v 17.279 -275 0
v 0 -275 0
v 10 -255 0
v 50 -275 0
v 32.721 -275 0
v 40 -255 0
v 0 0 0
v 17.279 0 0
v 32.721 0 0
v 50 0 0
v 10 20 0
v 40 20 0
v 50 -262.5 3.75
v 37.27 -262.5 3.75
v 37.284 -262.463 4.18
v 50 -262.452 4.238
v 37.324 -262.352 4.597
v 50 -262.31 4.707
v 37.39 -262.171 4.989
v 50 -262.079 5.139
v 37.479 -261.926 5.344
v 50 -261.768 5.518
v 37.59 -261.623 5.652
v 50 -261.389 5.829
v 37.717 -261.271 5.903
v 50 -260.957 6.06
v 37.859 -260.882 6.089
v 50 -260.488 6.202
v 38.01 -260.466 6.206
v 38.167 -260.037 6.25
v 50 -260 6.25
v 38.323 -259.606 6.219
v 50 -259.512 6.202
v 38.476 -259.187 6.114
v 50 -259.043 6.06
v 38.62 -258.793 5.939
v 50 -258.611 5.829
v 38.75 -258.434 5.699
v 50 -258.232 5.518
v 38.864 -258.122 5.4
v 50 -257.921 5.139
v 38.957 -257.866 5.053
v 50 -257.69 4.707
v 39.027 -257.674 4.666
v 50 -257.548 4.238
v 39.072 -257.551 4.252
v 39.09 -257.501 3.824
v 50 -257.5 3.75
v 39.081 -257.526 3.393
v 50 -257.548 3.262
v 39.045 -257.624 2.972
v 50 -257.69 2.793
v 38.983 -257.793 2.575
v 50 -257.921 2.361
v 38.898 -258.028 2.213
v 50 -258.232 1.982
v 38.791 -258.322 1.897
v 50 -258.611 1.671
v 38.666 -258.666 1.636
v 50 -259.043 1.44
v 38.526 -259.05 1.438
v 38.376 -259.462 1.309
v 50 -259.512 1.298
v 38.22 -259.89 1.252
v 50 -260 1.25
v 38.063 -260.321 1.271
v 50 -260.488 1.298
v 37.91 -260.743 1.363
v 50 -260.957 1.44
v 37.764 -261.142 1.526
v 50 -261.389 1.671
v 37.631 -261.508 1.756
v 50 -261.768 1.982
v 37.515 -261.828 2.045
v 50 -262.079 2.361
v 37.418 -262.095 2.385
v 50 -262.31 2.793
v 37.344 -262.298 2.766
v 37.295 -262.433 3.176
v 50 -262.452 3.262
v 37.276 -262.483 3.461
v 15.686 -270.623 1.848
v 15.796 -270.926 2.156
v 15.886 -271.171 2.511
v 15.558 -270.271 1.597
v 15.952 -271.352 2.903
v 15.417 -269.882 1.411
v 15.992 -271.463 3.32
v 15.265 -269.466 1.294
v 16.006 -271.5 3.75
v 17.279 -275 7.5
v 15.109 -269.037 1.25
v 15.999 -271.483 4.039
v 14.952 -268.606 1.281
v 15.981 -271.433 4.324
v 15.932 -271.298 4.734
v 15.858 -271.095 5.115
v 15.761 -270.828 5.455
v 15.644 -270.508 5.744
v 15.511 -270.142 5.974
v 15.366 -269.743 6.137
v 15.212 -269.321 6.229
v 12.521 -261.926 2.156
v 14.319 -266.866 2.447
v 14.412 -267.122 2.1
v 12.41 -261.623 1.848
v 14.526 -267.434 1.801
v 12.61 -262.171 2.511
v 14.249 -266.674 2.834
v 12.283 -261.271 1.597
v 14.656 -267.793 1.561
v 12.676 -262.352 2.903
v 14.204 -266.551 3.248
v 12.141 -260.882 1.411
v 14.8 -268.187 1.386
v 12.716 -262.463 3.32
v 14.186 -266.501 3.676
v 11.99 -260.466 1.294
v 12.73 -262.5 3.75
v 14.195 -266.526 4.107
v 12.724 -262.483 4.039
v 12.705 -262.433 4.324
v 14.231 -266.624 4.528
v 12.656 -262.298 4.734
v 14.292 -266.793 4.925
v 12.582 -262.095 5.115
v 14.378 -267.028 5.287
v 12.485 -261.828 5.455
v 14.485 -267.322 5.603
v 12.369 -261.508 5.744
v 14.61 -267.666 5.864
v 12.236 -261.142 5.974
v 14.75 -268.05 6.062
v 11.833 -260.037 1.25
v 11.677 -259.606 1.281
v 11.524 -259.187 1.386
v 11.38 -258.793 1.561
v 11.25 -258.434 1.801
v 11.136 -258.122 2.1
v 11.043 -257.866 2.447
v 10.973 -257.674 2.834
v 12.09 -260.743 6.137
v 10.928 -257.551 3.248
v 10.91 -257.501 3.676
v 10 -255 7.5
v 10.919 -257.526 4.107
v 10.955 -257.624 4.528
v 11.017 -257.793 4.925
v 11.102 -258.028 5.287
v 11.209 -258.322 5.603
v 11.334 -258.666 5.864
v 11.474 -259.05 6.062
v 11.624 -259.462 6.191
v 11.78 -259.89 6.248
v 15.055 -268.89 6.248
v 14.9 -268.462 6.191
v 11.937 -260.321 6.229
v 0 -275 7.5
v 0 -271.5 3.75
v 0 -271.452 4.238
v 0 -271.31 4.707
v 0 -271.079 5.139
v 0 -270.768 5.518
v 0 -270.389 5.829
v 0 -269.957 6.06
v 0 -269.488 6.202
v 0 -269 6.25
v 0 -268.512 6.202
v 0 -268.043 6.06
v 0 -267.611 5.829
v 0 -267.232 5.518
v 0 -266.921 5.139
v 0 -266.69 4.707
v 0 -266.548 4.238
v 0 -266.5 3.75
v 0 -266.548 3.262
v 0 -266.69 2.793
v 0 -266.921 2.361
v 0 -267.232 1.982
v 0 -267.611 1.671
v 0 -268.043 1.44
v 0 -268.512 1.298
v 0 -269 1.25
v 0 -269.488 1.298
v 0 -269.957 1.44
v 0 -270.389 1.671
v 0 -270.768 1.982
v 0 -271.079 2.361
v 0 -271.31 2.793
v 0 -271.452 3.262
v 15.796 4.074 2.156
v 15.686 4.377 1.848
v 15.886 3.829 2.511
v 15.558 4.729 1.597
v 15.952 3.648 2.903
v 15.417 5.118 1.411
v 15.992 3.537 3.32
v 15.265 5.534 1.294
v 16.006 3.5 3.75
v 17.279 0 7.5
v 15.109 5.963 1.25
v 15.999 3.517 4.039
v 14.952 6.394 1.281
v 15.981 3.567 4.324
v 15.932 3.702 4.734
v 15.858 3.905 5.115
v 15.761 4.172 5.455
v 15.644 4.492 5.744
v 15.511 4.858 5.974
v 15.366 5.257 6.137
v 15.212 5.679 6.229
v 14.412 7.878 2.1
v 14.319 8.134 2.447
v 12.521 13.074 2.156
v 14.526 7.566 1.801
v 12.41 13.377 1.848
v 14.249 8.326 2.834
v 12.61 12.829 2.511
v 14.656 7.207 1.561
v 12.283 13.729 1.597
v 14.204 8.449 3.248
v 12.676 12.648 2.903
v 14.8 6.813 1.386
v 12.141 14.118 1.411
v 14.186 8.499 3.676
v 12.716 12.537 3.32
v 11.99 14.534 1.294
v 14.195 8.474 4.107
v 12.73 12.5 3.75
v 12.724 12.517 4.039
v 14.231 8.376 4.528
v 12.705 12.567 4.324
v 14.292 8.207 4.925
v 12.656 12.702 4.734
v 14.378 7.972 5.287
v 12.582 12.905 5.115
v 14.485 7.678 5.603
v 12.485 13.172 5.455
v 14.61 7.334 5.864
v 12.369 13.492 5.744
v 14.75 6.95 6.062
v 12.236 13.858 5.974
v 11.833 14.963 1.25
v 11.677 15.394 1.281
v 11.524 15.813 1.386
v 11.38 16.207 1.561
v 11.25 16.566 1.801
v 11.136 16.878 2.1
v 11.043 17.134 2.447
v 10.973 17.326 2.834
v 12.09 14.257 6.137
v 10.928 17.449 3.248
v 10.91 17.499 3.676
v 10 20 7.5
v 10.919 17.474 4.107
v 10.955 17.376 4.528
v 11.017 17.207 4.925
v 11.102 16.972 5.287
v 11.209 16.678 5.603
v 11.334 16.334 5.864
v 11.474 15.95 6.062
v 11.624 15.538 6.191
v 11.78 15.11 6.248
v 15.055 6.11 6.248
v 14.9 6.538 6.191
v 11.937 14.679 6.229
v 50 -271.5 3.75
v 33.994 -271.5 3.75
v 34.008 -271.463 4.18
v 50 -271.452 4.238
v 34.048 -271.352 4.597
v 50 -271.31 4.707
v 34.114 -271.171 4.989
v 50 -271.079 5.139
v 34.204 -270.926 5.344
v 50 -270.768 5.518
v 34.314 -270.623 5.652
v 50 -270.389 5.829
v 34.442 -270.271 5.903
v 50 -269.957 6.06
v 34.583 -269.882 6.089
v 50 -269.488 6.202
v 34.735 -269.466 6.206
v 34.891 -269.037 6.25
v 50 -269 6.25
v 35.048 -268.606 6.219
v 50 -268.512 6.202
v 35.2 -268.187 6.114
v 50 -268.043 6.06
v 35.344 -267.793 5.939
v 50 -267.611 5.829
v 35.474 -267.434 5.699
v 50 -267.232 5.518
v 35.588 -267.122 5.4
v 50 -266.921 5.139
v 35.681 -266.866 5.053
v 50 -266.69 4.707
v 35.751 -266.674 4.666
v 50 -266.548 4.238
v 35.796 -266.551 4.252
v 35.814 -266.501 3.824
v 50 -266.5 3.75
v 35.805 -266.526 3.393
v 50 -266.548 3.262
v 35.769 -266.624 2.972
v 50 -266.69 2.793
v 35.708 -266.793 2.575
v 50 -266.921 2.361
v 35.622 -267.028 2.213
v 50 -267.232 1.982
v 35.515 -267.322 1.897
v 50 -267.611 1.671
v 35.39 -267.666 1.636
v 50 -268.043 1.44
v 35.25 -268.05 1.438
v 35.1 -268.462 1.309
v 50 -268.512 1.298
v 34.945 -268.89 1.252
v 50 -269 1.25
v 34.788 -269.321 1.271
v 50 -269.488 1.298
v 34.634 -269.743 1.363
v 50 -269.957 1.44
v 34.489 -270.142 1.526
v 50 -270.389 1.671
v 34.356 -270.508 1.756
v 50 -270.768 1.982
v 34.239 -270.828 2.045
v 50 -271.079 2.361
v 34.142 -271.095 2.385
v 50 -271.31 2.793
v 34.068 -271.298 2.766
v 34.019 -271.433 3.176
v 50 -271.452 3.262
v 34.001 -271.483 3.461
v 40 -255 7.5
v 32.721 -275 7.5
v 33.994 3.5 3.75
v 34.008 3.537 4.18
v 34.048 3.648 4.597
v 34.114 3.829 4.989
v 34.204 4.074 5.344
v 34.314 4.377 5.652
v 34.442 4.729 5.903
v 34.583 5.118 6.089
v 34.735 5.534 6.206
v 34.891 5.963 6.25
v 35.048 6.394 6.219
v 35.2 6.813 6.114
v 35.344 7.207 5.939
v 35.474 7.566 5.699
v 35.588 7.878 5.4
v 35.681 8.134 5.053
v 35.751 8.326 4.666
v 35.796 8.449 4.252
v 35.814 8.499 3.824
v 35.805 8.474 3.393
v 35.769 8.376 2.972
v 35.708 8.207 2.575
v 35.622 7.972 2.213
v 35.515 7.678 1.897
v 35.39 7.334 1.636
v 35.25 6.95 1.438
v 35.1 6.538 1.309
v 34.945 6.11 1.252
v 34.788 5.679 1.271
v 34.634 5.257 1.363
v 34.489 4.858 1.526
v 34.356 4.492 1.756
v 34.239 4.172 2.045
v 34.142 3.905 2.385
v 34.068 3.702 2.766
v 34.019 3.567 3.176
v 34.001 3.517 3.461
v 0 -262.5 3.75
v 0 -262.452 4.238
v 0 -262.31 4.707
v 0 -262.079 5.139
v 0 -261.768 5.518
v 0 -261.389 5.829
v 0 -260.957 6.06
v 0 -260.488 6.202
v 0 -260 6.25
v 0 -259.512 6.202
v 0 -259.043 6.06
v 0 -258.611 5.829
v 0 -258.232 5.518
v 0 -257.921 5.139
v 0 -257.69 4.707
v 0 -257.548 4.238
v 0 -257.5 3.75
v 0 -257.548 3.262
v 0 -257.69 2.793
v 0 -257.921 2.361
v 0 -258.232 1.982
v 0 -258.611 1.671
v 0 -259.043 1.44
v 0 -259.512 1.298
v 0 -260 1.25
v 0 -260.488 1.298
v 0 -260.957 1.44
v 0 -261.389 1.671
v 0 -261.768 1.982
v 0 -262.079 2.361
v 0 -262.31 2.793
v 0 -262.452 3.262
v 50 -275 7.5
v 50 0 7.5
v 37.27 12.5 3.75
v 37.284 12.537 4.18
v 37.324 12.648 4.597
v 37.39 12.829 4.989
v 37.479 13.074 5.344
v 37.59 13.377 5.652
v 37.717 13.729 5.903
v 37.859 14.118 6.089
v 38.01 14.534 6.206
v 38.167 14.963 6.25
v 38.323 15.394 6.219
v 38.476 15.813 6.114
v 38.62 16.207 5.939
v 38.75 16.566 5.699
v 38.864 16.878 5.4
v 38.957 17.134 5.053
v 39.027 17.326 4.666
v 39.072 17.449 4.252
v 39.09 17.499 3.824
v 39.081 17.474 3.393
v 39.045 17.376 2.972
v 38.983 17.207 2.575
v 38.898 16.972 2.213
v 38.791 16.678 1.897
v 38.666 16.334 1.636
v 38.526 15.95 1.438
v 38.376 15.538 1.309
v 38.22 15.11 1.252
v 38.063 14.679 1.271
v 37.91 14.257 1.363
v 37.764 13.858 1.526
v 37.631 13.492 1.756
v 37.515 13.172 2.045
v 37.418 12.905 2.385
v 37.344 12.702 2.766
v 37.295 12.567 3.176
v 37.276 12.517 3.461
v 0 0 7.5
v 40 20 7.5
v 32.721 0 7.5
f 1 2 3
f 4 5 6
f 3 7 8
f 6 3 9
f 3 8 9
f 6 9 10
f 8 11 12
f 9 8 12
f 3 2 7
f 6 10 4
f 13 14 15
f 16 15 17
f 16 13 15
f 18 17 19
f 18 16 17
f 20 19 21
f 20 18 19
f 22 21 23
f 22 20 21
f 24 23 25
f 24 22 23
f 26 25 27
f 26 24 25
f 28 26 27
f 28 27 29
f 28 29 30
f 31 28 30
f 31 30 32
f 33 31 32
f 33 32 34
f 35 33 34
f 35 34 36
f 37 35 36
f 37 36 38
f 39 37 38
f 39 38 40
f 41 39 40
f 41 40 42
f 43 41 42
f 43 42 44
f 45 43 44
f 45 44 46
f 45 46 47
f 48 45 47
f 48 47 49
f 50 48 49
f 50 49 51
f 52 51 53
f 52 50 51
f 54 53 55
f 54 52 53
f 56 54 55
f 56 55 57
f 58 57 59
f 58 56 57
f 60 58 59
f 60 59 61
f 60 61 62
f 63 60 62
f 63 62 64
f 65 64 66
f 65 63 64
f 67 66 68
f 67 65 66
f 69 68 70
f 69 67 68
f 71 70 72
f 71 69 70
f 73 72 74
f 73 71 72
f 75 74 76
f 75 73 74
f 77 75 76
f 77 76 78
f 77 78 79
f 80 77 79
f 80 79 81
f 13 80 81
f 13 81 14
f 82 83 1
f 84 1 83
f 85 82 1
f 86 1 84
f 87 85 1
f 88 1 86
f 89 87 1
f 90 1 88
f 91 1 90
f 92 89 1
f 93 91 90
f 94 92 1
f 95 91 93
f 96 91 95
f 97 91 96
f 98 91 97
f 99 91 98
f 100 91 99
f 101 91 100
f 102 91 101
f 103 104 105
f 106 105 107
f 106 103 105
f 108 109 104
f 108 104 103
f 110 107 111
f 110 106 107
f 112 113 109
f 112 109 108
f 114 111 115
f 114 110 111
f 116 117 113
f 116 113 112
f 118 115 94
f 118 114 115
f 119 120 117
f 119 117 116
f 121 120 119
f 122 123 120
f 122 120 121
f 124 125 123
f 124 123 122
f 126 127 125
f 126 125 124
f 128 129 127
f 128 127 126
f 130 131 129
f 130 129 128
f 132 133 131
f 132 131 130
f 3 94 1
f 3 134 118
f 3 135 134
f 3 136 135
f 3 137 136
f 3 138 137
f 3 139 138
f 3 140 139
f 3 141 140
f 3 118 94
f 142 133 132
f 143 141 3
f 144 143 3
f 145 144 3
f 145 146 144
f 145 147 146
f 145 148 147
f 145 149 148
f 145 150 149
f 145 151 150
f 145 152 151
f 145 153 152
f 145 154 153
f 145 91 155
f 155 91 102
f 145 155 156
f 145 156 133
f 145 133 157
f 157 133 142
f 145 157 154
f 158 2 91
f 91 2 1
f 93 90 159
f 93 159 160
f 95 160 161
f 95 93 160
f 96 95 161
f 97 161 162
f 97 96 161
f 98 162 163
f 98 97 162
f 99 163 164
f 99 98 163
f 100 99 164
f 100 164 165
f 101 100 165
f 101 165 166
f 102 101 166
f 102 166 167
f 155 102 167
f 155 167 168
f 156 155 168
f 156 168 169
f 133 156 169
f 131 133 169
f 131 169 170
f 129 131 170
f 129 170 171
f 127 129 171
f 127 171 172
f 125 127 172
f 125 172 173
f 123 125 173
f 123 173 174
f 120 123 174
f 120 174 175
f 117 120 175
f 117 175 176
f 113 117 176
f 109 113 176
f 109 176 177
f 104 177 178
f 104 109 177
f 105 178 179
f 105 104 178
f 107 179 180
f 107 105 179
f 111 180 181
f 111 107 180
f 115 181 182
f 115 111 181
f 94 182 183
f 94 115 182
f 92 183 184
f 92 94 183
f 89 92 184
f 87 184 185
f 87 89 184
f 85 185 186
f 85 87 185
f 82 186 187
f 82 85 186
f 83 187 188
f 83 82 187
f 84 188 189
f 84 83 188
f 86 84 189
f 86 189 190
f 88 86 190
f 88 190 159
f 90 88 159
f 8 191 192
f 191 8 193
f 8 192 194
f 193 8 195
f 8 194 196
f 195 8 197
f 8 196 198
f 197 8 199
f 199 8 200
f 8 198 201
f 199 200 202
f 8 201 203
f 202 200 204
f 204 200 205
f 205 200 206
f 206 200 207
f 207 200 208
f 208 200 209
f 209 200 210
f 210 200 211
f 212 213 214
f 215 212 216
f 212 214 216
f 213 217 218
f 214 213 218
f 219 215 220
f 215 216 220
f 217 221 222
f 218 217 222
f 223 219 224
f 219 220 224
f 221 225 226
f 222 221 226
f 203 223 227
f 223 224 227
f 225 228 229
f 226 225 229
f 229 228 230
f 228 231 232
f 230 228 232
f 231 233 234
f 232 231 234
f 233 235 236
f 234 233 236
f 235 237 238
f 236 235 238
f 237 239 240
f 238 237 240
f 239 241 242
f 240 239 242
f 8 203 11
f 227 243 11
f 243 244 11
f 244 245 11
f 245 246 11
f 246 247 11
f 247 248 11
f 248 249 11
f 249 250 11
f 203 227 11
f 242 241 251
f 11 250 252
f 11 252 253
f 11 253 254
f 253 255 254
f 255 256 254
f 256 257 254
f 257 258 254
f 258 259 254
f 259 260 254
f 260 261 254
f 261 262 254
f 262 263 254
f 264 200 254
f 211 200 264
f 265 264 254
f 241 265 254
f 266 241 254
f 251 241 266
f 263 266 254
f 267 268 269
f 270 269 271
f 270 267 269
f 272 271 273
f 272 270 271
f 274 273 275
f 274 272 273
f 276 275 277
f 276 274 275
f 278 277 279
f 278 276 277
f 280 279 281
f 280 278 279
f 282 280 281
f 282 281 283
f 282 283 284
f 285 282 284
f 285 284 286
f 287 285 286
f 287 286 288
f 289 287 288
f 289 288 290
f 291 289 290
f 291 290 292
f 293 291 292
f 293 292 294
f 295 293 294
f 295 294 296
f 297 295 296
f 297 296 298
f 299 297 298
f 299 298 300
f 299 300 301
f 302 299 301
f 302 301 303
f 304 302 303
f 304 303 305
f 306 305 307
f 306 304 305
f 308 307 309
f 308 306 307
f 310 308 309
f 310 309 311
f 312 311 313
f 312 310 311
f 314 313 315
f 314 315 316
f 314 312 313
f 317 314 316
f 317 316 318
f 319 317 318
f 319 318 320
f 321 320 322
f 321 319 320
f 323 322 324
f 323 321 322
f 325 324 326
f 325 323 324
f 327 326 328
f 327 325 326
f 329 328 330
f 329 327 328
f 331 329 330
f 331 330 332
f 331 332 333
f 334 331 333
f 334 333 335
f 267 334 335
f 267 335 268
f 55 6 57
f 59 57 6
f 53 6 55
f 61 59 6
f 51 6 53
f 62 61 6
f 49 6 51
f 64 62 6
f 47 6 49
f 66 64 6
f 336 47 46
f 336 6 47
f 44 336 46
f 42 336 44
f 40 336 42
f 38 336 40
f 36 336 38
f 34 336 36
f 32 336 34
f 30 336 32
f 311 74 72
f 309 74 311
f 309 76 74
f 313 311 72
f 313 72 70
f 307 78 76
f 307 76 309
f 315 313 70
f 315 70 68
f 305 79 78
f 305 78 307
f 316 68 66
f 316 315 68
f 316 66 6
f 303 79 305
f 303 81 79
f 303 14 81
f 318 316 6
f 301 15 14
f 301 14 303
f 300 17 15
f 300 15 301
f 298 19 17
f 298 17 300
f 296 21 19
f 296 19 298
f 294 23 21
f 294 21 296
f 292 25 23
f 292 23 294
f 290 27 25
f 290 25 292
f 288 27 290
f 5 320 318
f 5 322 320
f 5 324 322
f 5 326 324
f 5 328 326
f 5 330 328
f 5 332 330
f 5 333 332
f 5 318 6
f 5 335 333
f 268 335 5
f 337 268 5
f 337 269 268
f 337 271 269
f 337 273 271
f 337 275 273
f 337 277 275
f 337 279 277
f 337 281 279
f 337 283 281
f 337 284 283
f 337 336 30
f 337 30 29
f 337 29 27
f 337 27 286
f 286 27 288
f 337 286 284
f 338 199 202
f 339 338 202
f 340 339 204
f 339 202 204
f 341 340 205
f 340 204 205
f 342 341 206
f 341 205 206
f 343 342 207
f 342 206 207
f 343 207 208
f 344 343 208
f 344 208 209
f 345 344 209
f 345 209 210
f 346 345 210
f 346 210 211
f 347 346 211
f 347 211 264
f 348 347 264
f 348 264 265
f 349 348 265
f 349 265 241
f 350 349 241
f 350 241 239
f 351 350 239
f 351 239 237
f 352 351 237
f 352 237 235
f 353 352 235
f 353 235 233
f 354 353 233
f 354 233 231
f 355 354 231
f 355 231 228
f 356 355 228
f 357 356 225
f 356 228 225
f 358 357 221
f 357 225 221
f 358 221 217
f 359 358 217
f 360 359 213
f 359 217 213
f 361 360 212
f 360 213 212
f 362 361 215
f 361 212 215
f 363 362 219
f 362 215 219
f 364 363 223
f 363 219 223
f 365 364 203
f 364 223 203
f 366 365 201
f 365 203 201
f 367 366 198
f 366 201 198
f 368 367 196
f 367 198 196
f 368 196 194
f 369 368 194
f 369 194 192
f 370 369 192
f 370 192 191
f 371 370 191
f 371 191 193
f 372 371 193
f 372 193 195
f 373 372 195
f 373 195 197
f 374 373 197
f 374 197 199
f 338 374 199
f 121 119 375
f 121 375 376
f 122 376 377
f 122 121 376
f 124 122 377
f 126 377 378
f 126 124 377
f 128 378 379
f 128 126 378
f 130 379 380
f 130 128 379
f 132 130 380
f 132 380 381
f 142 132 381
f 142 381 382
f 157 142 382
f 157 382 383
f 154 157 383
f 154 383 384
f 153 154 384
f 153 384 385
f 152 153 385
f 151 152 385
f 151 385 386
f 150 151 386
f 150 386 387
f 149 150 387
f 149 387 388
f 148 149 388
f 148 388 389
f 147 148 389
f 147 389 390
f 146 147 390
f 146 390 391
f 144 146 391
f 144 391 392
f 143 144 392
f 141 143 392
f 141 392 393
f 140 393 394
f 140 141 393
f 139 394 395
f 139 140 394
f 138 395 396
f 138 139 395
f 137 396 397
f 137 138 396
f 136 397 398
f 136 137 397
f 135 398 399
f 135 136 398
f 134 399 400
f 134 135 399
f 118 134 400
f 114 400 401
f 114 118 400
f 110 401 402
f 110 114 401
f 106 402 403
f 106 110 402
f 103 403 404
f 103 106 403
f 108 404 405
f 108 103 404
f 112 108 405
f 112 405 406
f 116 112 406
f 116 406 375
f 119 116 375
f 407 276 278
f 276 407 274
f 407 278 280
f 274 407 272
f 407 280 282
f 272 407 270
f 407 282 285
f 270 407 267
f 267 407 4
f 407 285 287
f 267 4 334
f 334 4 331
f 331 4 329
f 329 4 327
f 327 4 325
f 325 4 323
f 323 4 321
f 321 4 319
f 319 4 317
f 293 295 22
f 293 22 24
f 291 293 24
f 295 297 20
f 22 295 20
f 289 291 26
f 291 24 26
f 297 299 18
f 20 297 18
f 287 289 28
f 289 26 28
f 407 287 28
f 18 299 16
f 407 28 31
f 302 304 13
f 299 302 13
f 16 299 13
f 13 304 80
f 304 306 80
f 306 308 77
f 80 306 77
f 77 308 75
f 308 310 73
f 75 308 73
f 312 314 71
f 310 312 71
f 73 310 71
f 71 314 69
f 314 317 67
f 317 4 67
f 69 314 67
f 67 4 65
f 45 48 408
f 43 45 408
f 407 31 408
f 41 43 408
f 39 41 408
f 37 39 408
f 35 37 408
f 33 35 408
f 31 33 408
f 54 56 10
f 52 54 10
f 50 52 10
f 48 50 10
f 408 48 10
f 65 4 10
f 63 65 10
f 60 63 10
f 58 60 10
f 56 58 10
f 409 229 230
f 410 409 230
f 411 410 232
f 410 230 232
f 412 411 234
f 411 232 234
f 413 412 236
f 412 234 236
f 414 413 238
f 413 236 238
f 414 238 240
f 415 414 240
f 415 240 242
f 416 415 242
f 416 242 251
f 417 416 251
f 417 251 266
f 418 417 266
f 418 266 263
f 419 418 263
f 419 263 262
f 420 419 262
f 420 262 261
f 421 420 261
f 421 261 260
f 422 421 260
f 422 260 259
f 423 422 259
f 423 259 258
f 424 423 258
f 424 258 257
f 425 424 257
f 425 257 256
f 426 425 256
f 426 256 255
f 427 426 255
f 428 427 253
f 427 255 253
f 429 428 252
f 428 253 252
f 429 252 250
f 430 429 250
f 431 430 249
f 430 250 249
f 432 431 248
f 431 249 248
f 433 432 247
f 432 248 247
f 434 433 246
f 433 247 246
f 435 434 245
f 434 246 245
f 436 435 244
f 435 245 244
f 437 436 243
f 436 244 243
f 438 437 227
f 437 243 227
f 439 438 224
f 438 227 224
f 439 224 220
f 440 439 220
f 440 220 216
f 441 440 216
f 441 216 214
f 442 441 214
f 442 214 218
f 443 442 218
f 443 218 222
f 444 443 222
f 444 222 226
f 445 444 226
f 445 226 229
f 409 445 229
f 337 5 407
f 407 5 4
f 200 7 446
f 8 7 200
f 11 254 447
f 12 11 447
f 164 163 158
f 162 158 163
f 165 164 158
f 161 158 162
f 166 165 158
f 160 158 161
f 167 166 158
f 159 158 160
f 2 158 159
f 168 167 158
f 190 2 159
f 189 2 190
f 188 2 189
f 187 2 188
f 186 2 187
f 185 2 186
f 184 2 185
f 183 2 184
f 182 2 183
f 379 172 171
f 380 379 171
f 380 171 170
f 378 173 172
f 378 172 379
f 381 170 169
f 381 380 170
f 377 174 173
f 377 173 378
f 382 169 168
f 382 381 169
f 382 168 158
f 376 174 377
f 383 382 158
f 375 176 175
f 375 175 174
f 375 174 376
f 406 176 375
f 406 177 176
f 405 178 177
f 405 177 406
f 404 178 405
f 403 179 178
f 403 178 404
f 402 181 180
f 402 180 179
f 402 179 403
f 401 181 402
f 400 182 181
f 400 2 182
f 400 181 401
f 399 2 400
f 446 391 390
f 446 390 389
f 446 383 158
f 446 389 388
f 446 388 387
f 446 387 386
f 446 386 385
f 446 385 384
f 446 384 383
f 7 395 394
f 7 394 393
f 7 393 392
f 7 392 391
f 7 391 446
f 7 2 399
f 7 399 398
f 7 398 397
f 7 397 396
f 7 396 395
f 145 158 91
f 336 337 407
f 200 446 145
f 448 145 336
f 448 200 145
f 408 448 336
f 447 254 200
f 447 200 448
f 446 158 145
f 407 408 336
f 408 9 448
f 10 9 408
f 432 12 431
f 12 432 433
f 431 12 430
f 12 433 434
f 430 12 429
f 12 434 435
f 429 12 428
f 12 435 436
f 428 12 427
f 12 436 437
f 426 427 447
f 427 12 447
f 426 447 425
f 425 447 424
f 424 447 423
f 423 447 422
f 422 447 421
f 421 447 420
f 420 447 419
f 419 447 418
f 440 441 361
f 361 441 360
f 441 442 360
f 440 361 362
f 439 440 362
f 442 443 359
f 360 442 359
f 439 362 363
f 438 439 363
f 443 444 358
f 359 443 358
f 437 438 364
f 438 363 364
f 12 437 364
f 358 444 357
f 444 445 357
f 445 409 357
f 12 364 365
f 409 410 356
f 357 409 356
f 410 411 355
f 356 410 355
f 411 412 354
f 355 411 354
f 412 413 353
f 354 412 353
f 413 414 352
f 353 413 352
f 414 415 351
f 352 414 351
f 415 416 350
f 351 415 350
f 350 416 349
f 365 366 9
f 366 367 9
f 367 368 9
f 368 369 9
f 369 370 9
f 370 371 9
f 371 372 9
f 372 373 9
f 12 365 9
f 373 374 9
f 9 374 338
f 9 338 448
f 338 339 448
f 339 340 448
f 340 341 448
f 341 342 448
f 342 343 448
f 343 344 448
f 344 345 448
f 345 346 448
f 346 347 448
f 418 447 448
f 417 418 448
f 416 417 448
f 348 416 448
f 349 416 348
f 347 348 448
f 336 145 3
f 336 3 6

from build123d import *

# Parameters (mm, degrees)
SKETCH1_W               = 50
SKETCH1_H               = 275
BOSS_EXTRUDE1_DEPTH     = 7.5
BOSS_EXTRUDE2_DEPTH     = 7.5
SKETCH3_R               = 2.5
CUT_EXTRUDE1_DEPTH      = 280.609102141
CUT_EXTRUDE2_REACH      = 281.609
CUT_EXTRUDE3_DEPTH      = 280.609102141
CUT_EXTRUDE3_DEPTH_BACK = 280.609102141
SKETCH5_R               = 2.5


with BuildPart() as part:
    # Sketch1 → Boss-Extrude1 (new body)
    with BuildSketch(Plane.XY):
        with Locations((25, -137.5)):
            Rectangle(SKETCH1_W, SKETCH1_H)
    extrude(amount=BOSS_EXTRUDE1_DEPTH)

    # Sketch2 → Boss-Extrude2 (add)
    with BuildSketch(Plane.XY.offset(7.5)):
        Polygon((17.279404685, 0), (10, 20), (40, 20), (32.720595315, 0), align=None)
    extrude(amount=-BOSS_EXTRUDE2_DEPTH)

    # Sketch3 → Cut-Extrude1 (cut, through all)
    with BuildSketch(Plane.ZY):
        with Locations(Location((3.75, 15, 0), (0, 0, 270))):
            Circle(SKETCH3_R)
        with Locations(Location((3.75, 6, 0), (0, 0, 270))):
            Circle(SKETCH3_R)
    extrude(amount=-CUT_EXTRUDE1_DEPTH, mode=Mode.SUBTRACT)

    # Sketch4 → Cut-Extrude2 (cut, up to next)
    with BuildSketch(Plane.XY.offset(7.5), mode=Mode.PRIVATE) as cut_extrude2_sk1:
        Polygon((17.279404685, -275), (10, -255), (40, -255), (32.720595315, -275), align=None)
    cut_extrude2_tool1 = extrude(cut_extrude2_sk1.sketch, amount=-CUT_EXTRUDE2_REACH, mode=Mode.PRIVATE) & part.part
    add(cut_extrude2_tool1.solids().sort_by_distance((25, -263.93204, 7.5))[0], mode=Mode.SUBTRACT)

    # Sketch5 → Cut-Extrude3 (cut, two sides: drawn at the far end of the back side and taken through both)
    with BuildSketch(Plane.ZY.offset(-CUT_EXTRUDE3_DEPTH_BACK)):
        with Locations(Location((3.75, -269, 0), (0, 0, 270))):
            Circle(SKETCH5_R)
        with Locations(Location((3.75, -260, 0), (0, 0, 270))):
            Circle(SKETCH5_R)
    extrude(amount=CUT_EXTRUDE3_DEPTH + CUT_EXTRUDE3_DEPTH_BACK, mode=Mode.SUBTRACT)


solid = part.part
